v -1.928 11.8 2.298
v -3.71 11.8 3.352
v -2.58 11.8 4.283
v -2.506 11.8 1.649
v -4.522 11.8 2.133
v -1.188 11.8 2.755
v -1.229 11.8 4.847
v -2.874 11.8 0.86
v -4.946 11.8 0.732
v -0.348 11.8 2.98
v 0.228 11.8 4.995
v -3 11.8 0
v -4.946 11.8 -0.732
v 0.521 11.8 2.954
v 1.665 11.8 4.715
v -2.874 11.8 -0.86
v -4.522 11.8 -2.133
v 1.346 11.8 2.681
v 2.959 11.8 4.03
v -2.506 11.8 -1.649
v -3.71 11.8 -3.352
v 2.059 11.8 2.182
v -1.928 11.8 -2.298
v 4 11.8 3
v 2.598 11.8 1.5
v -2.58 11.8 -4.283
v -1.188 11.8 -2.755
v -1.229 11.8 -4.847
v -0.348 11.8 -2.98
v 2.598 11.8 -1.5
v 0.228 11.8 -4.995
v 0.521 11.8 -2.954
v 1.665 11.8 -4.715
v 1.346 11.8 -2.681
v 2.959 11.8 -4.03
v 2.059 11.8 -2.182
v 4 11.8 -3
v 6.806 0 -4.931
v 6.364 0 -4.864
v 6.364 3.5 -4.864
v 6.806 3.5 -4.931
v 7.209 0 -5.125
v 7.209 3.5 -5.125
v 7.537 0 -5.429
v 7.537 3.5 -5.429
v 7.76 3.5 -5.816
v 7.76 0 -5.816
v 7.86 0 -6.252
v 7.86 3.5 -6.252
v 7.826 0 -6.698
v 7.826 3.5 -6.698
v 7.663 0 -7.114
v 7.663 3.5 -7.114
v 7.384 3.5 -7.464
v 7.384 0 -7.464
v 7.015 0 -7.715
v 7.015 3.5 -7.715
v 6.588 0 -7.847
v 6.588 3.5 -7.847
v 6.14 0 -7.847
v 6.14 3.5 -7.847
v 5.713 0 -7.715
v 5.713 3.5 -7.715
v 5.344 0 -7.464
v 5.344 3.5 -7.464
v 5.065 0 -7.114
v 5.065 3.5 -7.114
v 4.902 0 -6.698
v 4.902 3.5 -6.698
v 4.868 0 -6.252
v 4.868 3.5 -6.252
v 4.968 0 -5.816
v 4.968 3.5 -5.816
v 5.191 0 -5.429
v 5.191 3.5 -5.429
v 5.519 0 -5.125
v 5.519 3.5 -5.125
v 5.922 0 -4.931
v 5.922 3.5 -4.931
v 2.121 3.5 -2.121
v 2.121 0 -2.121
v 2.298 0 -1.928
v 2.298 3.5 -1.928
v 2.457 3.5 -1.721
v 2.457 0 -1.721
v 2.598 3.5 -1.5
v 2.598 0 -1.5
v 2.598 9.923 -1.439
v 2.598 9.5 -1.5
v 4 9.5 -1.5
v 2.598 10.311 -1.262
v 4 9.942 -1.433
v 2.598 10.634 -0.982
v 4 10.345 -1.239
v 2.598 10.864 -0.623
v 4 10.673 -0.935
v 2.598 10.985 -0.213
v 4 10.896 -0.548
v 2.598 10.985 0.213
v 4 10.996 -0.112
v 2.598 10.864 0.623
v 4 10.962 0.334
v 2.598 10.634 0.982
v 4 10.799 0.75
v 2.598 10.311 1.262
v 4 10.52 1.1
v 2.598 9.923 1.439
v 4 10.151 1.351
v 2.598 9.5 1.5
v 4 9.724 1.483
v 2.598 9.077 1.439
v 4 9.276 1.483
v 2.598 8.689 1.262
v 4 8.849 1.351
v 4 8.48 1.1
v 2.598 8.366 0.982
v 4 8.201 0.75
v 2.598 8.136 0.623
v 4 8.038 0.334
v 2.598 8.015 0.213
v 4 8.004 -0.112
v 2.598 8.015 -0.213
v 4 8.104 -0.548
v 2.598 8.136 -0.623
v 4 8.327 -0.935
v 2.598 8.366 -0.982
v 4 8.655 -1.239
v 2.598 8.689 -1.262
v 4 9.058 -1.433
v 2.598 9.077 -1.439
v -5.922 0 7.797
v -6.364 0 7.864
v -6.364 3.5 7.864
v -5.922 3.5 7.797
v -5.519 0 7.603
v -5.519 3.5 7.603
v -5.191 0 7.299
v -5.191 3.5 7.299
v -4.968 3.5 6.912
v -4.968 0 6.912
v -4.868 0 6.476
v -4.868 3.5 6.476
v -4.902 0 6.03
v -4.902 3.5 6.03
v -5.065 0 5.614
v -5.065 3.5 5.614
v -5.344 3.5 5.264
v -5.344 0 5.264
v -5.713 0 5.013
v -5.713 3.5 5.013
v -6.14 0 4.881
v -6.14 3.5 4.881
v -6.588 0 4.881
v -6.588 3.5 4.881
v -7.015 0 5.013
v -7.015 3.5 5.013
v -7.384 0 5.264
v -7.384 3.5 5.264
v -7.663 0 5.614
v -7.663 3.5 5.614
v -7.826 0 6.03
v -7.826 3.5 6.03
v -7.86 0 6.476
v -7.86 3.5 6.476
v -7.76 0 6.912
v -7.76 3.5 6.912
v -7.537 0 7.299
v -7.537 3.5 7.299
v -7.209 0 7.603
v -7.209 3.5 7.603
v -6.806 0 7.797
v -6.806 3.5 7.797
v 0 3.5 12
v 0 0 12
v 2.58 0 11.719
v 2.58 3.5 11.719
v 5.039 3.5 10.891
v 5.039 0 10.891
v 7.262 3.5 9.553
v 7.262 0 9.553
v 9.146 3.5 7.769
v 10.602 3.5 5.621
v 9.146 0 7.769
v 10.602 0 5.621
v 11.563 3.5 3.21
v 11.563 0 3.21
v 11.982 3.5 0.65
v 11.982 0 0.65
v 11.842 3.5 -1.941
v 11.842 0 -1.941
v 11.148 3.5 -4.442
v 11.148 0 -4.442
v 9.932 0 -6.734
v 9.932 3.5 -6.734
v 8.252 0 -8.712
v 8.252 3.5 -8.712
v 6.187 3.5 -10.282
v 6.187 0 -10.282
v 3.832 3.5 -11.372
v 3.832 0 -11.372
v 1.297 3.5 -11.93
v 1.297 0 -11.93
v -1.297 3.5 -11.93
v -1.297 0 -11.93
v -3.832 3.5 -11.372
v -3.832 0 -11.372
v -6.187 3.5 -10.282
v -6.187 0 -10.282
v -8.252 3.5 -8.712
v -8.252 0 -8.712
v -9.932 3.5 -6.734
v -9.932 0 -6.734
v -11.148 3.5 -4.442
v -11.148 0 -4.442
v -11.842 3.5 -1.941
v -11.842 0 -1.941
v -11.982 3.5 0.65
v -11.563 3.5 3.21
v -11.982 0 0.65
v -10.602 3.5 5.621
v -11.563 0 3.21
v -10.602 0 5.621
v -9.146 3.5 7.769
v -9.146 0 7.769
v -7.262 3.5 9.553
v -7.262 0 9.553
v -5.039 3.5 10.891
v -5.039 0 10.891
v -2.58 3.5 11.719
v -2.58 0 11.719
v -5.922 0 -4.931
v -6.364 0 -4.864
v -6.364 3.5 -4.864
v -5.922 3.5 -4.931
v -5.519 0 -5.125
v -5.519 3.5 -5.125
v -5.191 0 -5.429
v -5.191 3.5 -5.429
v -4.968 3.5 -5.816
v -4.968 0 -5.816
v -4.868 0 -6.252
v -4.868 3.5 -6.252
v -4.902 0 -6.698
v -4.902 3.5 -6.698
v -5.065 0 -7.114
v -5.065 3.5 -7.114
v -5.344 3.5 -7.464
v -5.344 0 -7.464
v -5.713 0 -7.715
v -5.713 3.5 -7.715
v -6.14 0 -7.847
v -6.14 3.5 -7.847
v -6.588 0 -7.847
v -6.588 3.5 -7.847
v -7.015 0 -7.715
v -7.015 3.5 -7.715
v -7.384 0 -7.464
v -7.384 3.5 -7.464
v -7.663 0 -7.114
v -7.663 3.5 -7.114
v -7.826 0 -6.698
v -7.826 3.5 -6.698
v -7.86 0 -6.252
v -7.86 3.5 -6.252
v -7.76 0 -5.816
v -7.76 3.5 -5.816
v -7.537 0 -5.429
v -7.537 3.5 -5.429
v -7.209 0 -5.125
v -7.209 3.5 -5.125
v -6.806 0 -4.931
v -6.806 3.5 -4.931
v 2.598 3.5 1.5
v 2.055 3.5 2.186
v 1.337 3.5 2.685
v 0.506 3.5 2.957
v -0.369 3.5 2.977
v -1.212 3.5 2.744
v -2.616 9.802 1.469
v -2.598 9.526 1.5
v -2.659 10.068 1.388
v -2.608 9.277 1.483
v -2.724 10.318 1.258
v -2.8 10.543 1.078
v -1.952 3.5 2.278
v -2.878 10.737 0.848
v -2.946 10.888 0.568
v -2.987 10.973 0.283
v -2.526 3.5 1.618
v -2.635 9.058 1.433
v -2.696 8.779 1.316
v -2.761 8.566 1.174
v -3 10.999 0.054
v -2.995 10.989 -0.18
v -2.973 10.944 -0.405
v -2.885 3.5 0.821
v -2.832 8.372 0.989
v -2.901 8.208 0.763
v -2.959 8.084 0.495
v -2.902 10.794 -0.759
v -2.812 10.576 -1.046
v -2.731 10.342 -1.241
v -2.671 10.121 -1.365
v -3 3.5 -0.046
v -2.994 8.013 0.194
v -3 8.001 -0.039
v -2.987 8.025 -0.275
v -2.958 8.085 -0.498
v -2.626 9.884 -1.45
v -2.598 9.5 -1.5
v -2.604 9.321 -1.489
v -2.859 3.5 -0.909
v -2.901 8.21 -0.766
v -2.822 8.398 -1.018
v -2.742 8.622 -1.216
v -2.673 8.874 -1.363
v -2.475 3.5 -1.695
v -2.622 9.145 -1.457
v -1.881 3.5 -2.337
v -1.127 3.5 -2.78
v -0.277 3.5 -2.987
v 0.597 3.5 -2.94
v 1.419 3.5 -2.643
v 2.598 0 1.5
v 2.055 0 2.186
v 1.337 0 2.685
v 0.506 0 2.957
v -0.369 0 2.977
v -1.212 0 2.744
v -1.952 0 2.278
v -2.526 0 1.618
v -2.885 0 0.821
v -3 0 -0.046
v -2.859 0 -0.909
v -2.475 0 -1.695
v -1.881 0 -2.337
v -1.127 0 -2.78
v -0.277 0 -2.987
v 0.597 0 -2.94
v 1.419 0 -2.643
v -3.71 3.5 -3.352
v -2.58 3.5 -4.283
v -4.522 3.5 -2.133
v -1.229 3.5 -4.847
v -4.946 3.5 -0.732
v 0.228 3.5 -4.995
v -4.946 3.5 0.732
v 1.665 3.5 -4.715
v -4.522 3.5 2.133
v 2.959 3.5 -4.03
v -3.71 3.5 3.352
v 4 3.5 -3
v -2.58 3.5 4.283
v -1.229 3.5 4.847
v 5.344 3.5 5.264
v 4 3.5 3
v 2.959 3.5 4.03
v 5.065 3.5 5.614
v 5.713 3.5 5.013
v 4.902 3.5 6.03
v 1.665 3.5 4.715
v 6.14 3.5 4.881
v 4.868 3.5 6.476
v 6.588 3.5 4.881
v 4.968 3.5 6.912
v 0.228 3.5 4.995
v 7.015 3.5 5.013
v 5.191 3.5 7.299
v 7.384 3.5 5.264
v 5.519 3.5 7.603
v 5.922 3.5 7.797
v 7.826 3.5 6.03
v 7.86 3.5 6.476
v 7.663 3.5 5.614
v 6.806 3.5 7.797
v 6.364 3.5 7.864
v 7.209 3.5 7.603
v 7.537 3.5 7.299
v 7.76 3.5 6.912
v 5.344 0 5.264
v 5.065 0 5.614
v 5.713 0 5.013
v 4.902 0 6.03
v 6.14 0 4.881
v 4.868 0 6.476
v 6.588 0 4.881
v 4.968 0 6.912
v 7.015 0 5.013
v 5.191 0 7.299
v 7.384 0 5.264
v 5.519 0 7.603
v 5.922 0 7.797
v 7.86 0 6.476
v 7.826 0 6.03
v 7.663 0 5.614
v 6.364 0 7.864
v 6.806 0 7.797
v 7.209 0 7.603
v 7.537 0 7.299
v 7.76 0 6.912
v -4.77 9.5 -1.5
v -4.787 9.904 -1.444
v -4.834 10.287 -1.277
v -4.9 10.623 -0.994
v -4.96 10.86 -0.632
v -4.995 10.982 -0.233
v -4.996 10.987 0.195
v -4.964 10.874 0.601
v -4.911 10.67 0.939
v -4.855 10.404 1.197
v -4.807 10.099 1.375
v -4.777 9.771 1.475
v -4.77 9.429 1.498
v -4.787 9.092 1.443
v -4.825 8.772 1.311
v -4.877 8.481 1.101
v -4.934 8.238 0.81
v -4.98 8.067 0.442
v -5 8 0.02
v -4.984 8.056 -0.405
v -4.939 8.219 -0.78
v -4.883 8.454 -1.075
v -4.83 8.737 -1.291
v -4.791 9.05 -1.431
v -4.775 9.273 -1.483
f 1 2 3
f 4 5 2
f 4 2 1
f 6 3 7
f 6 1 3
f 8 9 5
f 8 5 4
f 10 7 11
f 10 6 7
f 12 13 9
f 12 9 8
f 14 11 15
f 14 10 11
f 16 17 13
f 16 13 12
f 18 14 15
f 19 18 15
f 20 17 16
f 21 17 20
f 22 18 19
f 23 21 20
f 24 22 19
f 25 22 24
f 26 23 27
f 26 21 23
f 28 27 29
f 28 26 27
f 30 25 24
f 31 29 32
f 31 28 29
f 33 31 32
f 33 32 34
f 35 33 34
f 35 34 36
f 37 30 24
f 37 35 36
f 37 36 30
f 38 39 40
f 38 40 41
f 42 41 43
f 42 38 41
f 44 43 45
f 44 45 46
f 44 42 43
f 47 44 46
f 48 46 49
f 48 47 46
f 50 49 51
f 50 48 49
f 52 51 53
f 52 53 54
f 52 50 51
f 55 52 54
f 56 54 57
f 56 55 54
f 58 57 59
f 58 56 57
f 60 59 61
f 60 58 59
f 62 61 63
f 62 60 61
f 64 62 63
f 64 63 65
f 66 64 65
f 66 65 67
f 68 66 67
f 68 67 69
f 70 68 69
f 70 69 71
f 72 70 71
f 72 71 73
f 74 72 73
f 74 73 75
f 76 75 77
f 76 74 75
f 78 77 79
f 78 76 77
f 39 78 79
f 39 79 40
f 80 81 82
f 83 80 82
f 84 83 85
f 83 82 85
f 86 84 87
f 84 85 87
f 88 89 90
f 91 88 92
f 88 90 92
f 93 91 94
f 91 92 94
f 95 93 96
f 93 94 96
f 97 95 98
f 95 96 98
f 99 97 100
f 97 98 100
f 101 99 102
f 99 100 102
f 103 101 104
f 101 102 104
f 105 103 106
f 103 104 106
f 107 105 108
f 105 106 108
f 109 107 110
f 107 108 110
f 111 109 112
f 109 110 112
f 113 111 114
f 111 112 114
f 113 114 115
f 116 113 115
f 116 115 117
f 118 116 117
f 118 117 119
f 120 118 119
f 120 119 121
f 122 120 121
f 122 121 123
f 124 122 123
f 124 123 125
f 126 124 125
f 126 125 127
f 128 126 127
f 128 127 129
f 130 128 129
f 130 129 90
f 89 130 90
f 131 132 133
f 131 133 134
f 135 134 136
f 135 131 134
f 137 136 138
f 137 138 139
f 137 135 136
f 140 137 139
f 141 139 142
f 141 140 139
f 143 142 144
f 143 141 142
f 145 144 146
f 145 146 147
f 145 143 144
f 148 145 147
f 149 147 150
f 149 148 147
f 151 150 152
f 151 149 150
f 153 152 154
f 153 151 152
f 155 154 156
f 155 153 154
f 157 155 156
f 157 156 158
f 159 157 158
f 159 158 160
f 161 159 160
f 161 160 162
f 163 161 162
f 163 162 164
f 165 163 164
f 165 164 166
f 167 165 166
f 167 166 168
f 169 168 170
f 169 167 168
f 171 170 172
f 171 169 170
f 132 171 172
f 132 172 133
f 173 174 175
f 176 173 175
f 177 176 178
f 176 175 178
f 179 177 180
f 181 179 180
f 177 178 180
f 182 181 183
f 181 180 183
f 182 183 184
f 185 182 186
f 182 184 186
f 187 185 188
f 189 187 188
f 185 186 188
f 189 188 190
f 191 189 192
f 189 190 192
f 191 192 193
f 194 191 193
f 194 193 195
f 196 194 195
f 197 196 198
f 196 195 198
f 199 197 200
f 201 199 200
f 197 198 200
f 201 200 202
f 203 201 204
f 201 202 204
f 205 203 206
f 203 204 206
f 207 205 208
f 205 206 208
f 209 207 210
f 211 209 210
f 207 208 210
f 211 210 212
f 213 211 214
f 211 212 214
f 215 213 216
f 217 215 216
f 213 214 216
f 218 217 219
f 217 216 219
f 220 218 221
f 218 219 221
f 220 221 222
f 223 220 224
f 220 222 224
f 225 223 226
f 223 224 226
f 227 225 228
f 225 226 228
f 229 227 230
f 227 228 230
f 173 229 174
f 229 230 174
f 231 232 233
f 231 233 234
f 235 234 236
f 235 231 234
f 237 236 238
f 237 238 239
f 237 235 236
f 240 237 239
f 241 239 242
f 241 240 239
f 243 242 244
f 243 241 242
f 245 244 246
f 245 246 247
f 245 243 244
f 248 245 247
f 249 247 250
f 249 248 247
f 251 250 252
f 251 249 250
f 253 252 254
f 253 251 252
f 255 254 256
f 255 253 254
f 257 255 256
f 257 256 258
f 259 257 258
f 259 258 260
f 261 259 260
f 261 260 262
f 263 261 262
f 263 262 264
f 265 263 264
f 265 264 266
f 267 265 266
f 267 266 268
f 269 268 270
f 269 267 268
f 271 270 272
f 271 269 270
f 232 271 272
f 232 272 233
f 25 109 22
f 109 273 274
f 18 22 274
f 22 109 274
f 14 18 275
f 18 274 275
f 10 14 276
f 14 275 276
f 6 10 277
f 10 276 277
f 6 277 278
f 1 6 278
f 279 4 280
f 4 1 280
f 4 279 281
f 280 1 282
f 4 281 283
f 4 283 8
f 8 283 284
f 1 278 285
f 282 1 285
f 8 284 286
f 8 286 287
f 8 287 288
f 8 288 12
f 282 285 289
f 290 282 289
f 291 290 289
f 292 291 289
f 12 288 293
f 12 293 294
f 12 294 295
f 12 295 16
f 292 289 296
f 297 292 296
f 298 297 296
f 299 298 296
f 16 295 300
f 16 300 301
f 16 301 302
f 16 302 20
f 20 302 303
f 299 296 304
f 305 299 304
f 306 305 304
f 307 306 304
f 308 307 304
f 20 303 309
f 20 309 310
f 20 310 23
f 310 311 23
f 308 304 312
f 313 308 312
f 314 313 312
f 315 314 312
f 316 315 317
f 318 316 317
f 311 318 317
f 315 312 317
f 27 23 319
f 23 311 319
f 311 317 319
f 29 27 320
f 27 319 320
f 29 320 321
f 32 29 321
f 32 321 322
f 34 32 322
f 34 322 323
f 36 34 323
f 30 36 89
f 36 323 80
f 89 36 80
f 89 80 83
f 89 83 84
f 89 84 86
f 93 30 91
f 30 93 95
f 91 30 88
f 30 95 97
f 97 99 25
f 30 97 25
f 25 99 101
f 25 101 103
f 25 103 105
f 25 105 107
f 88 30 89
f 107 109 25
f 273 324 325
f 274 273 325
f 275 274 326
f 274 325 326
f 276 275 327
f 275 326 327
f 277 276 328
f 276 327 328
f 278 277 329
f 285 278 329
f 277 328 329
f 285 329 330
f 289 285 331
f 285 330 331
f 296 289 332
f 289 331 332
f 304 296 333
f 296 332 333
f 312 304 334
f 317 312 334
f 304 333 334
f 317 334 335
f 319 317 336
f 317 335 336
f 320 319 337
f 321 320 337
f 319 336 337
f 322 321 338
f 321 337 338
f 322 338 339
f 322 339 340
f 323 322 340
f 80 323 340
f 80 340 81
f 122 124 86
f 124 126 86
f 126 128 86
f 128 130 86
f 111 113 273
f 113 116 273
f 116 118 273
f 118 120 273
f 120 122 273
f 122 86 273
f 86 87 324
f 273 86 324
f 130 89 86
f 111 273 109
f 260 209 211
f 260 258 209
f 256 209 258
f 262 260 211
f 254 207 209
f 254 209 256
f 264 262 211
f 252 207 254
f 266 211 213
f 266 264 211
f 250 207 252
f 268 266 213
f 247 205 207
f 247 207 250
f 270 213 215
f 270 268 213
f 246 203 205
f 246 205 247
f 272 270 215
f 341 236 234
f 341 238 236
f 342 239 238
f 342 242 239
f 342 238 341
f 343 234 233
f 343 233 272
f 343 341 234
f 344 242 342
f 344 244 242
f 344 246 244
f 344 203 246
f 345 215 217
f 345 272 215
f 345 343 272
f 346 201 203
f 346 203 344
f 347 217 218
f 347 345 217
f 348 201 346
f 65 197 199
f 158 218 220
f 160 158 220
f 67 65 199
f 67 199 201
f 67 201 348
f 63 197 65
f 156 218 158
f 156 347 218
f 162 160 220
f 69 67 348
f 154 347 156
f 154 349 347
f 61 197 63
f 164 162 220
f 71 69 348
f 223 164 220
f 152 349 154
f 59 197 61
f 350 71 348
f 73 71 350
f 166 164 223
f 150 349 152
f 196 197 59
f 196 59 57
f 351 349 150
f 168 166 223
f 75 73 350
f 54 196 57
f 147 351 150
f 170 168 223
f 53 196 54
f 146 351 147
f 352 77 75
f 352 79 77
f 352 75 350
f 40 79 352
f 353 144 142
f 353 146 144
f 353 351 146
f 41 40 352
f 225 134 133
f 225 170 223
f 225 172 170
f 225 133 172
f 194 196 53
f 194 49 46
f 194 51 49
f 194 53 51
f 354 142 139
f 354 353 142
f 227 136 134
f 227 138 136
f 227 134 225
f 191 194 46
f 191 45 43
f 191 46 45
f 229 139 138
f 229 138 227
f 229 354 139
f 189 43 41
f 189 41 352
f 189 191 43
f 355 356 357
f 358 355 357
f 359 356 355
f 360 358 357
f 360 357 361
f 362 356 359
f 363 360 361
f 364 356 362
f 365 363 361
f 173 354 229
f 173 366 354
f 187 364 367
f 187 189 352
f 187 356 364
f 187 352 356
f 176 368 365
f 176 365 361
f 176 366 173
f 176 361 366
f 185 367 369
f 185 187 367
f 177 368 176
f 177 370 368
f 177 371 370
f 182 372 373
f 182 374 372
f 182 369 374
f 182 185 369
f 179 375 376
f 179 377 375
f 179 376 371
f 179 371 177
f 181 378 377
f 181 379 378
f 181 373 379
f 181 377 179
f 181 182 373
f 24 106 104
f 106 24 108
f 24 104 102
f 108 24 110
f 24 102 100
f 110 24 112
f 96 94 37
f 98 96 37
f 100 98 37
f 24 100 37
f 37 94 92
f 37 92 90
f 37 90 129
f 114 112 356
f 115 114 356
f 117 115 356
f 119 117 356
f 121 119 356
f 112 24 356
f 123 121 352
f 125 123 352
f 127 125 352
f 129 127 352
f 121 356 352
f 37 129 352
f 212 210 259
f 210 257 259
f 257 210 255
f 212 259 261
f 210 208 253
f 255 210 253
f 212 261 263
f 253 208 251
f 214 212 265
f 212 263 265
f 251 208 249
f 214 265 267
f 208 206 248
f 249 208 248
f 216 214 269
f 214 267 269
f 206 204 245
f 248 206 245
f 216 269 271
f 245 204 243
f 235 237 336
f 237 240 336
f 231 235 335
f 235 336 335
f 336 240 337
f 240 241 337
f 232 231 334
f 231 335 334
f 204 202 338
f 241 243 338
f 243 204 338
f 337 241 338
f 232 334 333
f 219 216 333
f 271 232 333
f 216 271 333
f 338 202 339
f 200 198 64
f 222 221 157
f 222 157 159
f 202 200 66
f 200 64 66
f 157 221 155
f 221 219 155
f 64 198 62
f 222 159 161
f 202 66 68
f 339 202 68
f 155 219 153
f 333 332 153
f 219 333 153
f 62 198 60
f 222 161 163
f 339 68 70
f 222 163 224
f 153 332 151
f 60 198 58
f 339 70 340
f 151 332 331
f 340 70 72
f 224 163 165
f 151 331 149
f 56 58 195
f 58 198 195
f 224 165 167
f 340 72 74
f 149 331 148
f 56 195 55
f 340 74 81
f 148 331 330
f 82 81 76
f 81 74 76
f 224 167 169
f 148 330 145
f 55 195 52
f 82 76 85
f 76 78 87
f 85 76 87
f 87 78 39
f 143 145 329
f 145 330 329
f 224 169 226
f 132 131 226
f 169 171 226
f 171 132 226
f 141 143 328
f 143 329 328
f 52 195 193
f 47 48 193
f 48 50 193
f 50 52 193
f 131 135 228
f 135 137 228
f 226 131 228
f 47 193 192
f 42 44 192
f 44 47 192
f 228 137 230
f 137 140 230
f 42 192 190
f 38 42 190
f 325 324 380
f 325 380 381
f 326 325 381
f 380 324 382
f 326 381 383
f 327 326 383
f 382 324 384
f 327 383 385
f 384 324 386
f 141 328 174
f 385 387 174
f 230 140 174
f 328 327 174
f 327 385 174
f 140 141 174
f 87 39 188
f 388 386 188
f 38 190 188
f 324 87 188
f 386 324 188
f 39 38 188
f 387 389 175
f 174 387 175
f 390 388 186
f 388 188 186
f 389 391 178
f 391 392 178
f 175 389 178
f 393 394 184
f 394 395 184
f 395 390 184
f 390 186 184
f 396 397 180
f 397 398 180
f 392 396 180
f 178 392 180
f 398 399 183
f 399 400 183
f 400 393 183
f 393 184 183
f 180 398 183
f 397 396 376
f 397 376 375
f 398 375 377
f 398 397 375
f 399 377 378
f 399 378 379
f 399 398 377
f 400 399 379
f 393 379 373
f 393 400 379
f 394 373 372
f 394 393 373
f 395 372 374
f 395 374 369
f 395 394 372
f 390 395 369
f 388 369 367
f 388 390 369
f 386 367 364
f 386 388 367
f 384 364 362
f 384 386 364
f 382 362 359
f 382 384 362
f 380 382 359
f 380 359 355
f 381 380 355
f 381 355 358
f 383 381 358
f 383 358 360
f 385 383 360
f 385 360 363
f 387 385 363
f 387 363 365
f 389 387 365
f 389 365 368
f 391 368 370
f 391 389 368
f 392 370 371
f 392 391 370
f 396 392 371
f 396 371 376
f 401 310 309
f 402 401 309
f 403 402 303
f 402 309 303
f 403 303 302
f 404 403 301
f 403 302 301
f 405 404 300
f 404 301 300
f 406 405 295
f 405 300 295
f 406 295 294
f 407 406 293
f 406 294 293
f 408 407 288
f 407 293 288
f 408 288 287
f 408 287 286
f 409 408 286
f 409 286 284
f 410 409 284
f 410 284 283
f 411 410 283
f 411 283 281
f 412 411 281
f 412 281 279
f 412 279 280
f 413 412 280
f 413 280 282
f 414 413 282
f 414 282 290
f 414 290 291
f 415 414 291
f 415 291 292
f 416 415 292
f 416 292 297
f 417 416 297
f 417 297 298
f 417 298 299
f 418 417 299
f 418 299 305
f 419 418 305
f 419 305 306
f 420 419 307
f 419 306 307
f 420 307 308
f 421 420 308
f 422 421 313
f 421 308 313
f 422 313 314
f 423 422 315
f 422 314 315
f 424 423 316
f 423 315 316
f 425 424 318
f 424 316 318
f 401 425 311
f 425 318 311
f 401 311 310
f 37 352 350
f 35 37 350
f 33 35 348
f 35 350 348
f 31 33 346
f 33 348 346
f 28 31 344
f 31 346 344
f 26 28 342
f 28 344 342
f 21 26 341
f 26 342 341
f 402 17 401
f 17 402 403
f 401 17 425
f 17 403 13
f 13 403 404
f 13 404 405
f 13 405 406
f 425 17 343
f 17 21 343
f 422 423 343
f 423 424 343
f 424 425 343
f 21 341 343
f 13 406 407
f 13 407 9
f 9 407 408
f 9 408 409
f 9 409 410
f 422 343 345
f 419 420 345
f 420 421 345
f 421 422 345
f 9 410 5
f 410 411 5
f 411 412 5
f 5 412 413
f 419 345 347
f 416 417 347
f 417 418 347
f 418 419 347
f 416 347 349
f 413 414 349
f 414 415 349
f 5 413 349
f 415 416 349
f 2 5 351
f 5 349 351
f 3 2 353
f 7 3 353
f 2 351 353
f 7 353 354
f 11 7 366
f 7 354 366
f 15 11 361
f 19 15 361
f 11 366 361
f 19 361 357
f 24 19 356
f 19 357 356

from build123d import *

# Parameters (mm, degrees)
SKETCH1_R           = 12
SKETCH1_R_2         = 1.5
BOSS_EXTRUDE1_DEPTH = 3.5
BOSS_EXTRUDE2_DEPTH = 8.3
SKETCH3_R           = 1.5
CUT_EXTRUDE1_DEPTH  = 19


with BuildPart() as part:
    # Sketch1 → Boss-Extrude1 (new body)
    with BuildSketch(Plane(origin=(0, 0, 0), x_dir=(1, 0, 0), z_dir=(0, 1, 0))):
        with Locations(Location((0, 0, 0), (0, 0, 270))):
            Circle(SKETCH1_R)
        with BuildLine():
            Line((2.598076211, 1.5), (2.598076211, -1.5))
            ThreePointArc((2.598076211, -1.5), (-2.974334584, -0.391578577), (2.121320344, 2.121320344))
            ThreePointArc((2.121320344, 2.121320344), (2.380060021, 1.826284287), (2.598076211, 1.5))
        make_face(mode=Mode.SUBTRACT)
        with Locations(Location((-6.363961031, -6.363961031, 0), (0, 0, 270))):
            Circle(SKETCH1_R_2, mode=Mode.SUBTRACT)
        with Locations(Location((6.363961031, -6.363961031, 0), (0, 0, 270))):
            Circle(SKETCH1_R_2, mode=Mode.SUBTRACT)
        with Locations(Location((-6.363961031, 6.363961031, 0), (0, 0, 270))):
            Circle(SKETCH1_R_2, mode=Mode.SUBTRACT)
        with Locations(Location((6.363961031, 6.363961031, 0), (0, 0, 270))):
            Circle(SKETCH1_R_2, mode=Mode.SUBTRACT)
    extrude(amount=BOSS_EXTRUDE1_DEPTH)

    # Sketch2 → Boss-Extrude2 (add)
    with BuildSketch(Plane(origin=(0, 3.5, 0), x_dir=(1, 0, 0), z_dir=(0, 1, 0))):
        with BuildLine():
            Line((4, -3), (4, 3))
            ThreePointArc((4, 3), (-5, 0), (4, -3))
        make_face()
        with BuildLine():
            Line((2.598076211, 1.5), (2.598076211, -1.5))
            ThreePointArc((2.598076211, -1.5), (-3, 0), (2.598076211, 1.5))
        make_face(mode=Mode.SUBTRACT)
    extrude(amount=BOSS_EXTRUDE2_DEPTH)

    # Sketch3 → Cut-Extrude1 (cut)
    with BuildSketch(Plane(origin=(4, 0, 0), x_dir=(0, 0, -1), z_dir=(1, 0, 0))):
        with Locations((0, 9.5)):
            Circle(SKETCH3_R)
    extrude(amount=-CUT_EXTRUDE1_DEPTH, mode=Mode.SUBTRACT)


solid = part.part
